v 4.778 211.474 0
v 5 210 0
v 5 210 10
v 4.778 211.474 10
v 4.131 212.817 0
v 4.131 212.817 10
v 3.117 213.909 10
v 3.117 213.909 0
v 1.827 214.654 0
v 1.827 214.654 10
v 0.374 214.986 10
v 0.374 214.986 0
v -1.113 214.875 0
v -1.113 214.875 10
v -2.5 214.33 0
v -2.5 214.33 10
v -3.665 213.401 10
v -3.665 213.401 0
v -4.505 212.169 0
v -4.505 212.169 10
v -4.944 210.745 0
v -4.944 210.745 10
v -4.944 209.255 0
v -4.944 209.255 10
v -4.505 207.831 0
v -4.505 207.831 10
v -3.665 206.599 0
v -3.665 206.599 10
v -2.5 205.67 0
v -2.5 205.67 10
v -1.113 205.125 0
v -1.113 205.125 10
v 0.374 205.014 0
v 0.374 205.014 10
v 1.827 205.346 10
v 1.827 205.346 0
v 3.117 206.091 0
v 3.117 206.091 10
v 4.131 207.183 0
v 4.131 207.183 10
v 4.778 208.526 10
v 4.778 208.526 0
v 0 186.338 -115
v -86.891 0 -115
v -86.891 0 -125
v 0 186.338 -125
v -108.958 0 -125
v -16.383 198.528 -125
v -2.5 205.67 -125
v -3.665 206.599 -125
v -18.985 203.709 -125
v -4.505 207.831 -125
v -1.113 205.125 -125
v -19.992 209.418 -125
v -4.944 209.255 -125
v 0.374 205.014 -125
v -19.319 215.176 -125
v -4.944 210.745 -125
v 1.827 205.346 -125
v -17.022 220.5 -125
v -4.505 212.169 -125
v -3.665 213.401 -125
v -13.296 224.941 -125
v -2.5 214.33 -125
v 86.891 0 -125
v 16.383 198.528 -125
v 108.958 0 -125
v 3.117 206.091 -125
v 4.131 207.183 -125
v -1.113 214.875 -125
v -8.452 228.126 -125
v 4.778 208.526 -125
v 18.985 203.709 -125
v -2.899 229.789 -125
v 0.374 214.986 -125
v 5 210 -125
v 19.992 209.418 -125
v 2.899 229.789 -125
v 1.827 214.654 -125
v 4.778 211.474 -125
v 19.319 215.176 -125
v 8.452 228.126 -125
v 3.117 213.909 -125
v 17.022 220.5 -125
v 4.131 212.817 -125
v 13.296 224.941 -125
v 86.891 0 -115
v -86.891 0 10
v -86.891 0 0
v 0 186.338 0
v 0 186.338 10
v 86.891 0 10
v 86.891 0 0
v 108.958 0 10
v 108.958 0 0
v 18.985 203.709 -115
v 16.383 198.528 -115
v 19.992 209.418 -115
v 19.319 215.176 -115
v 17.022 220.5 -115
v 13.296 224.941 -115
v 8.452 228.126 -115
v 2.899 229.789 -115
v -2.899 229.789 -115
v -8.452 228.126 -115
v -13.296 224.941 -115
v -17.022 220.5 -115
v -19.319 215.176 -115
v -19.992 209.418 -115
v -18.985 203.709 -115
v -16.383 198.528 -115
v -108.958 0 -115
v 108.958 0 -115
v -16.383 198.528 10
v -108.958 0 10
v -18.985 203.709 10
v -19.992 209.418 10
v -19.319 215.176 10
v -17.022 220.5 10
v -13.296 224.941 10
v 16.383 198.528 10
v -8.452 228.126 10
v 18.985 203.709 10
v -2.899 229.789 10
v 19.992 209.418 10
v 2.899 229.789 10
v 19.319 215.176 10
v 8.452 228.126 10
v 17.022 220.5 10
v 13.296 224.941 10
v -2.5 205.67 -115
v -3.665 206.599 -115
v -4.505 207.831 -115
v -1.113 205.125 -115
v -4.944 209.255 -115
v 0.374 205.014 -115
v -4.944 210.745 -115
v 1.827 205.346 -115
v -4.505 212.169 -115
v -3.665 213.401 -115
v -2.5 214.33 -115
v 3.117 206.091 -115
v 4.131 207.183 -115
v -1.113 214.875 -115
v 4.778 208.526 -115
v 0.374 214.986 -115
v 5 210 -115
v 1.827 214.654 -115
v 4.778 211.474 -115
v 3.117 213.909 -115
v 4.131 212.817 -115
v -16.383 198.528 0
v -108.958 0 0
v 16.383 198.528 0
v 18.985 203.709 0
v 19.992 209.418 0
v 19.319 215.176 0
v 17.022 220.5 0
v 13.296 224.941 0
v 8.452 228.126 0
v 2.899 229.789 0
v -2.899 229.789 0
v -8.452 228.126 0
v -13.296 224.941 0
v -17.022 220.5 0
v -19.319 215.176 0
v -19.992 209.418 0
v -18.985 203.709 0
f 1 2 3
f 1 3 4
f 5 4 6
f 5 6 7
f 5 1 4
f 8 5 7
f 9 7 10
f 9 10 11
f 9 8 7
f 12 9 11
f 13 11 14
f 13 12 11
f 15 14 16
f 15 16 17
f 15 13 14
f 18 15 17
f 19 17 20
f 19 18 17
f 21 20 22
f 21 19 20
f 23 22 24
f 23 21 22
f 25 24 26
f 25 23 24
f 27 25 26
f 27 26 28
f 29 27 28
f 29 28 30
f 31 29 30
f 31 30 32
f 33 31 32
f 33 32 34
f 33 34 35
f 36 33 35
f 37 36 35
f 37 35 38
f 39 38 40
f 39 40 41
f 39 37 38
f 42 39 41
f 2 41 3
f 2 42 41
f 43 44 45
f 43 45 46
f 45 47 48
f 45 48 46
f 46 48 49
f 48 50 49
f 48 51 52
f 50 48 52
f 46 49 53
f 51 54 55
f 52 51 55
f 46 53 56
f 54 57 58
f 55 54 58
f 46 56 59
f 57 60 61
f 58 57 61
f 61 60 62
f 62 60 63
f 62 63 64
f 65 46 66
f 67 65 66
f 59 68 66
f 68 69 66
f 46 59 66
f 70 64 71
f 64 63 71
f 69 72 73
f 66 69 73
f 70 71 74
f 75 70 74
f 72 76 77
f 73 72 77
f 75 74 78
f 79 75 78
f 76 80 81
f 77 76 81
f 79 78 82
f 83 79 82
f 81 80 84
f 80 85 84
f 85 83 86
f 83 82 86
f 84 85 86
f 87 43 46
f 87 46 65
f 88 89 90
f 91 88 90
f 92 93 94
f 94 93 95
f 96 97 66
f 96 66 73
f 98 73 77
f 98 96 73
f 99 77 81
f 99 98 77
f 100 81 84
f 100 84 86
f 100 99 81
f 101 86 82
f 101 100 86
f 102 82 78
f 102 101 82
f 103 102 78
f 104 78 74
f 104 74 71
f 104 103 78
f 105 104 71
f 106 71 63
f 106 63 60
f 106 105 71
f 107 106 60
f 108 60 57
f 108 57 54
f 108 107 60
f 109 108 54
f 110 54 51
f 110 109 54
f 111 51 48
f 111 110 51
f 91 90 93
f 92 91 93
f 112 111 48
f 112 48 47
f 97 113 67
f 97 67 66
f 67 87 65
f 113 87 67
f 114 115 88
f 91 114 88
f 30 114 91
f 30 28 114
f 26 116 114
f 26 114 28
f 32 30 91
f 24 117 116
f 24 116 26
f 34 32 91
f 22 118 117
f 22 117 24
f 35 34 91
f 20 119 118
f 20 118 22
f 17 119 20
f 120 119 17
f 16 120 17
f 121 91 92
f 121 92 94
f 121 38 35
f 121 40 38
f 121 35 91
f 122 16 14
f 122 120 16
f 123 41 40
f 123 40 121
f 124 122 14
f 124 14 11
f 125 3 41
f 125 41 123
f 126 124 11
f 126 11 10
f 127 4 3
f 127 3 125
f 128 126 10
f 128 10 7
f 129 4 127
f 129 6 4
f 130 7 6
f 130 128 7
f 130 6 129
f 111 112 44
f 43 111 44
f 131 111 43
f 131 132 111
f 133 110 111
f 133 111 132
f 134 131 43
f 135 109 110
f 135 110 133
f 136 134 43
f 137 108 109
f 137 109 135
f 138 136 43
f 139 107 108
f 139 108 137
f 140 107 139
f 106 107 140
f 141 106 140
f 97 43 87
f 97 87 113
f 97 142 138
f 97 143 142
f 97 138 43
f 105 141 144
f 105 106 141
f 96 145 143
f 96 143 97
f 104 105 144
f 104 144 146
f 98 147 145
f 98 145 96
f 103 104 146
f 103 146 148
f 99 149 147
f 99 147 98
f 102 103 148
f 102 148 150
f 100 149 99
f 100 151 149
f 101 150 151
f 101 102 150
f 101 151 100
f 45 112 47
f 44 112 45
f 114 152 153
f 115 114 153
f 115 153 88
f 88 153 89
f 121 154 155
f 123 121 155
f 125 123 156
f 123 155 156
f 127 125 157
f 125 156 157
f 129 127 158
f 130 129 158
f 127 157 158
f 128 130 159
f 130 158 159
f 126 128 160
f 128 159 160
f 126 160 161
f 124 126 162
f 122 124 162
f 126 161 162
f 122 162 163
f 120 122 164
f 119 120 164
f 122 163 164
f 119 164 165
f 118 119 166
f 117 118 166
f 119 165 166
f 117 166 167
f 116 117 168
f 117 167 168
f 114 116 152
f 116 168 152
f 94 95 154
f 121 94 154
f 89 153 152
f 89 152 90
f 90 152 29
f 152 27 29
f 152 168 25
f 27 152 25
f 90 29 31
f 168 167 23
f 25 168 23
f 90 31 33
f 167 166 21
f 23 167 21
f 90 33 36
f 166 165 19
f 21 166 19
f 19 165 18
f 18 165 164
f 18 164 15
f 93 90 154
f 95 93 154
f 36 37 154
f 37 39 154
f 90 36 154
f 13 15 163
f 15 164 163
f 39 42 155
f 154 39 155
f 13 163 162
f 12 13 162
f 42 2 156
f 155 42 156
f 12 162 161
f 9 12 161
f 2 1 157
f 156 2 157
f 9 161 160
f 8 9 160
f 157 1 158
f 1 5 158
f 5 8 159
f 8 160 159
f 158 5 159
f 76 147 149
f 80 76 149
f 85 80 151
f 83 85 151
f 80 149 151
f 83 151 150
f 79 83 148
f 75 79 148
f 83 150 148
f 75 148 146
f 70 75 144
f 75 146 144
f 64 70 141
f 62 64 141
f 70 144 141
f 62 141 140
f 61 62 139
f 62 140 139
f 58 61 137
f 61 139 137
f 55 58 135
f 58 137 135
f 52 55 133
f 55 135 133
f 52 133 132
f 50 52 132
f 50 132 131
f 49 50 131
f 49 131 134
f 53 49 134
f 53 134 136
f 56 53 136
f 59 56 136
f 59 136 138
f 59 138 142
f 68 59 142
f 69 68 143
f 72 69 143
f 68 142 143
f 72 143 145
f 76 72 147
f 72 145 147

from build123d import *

# Parameters (mm, degrees)
SKETCH1_R           = 5
BOSS_EXTRUDE1_DEPTH = 10


with BuildPart() as part:
    # Sketch1 → Boss-Extrude1 (new body)
    with BuildSketch(Plane.XY):
        with BuildLine():
            Line((-16.383040886, 198.528471273), (-108.958387402, 0))
            Line((-108.958387402, 0), (-86.890829023, 0))
            Line((-86.890829023, 0), (0, 186.337984168))
            Line((0, 186.337984168), (86.890829023, 0))
            Line((86.890829023, 0), (108.958387402, 0))
            Line((108.958387402, 0), (16.383040886, 198.528471273))
            ThreePointArc((16.383040886, 198.528471273), (0, 230), (-16.383040886, 198.528471273))
        make_face()
        with Locations((0, 210)):
            Circle(SKETCH1_R, mode=Mode.SUBTRACT)
    extrude(amount=BOSS_EXTRUDE1_DEPTH)


with BuildPart() as body_2:
    # Mirror2: mirrored copy
    add(part.part.mirror(Plane(origin=(0, 0, -57.5), x_dir=(1, 0, 0), z_dir=(0, 0, -1))))


solid = Compound([part.part, body_2.part])
